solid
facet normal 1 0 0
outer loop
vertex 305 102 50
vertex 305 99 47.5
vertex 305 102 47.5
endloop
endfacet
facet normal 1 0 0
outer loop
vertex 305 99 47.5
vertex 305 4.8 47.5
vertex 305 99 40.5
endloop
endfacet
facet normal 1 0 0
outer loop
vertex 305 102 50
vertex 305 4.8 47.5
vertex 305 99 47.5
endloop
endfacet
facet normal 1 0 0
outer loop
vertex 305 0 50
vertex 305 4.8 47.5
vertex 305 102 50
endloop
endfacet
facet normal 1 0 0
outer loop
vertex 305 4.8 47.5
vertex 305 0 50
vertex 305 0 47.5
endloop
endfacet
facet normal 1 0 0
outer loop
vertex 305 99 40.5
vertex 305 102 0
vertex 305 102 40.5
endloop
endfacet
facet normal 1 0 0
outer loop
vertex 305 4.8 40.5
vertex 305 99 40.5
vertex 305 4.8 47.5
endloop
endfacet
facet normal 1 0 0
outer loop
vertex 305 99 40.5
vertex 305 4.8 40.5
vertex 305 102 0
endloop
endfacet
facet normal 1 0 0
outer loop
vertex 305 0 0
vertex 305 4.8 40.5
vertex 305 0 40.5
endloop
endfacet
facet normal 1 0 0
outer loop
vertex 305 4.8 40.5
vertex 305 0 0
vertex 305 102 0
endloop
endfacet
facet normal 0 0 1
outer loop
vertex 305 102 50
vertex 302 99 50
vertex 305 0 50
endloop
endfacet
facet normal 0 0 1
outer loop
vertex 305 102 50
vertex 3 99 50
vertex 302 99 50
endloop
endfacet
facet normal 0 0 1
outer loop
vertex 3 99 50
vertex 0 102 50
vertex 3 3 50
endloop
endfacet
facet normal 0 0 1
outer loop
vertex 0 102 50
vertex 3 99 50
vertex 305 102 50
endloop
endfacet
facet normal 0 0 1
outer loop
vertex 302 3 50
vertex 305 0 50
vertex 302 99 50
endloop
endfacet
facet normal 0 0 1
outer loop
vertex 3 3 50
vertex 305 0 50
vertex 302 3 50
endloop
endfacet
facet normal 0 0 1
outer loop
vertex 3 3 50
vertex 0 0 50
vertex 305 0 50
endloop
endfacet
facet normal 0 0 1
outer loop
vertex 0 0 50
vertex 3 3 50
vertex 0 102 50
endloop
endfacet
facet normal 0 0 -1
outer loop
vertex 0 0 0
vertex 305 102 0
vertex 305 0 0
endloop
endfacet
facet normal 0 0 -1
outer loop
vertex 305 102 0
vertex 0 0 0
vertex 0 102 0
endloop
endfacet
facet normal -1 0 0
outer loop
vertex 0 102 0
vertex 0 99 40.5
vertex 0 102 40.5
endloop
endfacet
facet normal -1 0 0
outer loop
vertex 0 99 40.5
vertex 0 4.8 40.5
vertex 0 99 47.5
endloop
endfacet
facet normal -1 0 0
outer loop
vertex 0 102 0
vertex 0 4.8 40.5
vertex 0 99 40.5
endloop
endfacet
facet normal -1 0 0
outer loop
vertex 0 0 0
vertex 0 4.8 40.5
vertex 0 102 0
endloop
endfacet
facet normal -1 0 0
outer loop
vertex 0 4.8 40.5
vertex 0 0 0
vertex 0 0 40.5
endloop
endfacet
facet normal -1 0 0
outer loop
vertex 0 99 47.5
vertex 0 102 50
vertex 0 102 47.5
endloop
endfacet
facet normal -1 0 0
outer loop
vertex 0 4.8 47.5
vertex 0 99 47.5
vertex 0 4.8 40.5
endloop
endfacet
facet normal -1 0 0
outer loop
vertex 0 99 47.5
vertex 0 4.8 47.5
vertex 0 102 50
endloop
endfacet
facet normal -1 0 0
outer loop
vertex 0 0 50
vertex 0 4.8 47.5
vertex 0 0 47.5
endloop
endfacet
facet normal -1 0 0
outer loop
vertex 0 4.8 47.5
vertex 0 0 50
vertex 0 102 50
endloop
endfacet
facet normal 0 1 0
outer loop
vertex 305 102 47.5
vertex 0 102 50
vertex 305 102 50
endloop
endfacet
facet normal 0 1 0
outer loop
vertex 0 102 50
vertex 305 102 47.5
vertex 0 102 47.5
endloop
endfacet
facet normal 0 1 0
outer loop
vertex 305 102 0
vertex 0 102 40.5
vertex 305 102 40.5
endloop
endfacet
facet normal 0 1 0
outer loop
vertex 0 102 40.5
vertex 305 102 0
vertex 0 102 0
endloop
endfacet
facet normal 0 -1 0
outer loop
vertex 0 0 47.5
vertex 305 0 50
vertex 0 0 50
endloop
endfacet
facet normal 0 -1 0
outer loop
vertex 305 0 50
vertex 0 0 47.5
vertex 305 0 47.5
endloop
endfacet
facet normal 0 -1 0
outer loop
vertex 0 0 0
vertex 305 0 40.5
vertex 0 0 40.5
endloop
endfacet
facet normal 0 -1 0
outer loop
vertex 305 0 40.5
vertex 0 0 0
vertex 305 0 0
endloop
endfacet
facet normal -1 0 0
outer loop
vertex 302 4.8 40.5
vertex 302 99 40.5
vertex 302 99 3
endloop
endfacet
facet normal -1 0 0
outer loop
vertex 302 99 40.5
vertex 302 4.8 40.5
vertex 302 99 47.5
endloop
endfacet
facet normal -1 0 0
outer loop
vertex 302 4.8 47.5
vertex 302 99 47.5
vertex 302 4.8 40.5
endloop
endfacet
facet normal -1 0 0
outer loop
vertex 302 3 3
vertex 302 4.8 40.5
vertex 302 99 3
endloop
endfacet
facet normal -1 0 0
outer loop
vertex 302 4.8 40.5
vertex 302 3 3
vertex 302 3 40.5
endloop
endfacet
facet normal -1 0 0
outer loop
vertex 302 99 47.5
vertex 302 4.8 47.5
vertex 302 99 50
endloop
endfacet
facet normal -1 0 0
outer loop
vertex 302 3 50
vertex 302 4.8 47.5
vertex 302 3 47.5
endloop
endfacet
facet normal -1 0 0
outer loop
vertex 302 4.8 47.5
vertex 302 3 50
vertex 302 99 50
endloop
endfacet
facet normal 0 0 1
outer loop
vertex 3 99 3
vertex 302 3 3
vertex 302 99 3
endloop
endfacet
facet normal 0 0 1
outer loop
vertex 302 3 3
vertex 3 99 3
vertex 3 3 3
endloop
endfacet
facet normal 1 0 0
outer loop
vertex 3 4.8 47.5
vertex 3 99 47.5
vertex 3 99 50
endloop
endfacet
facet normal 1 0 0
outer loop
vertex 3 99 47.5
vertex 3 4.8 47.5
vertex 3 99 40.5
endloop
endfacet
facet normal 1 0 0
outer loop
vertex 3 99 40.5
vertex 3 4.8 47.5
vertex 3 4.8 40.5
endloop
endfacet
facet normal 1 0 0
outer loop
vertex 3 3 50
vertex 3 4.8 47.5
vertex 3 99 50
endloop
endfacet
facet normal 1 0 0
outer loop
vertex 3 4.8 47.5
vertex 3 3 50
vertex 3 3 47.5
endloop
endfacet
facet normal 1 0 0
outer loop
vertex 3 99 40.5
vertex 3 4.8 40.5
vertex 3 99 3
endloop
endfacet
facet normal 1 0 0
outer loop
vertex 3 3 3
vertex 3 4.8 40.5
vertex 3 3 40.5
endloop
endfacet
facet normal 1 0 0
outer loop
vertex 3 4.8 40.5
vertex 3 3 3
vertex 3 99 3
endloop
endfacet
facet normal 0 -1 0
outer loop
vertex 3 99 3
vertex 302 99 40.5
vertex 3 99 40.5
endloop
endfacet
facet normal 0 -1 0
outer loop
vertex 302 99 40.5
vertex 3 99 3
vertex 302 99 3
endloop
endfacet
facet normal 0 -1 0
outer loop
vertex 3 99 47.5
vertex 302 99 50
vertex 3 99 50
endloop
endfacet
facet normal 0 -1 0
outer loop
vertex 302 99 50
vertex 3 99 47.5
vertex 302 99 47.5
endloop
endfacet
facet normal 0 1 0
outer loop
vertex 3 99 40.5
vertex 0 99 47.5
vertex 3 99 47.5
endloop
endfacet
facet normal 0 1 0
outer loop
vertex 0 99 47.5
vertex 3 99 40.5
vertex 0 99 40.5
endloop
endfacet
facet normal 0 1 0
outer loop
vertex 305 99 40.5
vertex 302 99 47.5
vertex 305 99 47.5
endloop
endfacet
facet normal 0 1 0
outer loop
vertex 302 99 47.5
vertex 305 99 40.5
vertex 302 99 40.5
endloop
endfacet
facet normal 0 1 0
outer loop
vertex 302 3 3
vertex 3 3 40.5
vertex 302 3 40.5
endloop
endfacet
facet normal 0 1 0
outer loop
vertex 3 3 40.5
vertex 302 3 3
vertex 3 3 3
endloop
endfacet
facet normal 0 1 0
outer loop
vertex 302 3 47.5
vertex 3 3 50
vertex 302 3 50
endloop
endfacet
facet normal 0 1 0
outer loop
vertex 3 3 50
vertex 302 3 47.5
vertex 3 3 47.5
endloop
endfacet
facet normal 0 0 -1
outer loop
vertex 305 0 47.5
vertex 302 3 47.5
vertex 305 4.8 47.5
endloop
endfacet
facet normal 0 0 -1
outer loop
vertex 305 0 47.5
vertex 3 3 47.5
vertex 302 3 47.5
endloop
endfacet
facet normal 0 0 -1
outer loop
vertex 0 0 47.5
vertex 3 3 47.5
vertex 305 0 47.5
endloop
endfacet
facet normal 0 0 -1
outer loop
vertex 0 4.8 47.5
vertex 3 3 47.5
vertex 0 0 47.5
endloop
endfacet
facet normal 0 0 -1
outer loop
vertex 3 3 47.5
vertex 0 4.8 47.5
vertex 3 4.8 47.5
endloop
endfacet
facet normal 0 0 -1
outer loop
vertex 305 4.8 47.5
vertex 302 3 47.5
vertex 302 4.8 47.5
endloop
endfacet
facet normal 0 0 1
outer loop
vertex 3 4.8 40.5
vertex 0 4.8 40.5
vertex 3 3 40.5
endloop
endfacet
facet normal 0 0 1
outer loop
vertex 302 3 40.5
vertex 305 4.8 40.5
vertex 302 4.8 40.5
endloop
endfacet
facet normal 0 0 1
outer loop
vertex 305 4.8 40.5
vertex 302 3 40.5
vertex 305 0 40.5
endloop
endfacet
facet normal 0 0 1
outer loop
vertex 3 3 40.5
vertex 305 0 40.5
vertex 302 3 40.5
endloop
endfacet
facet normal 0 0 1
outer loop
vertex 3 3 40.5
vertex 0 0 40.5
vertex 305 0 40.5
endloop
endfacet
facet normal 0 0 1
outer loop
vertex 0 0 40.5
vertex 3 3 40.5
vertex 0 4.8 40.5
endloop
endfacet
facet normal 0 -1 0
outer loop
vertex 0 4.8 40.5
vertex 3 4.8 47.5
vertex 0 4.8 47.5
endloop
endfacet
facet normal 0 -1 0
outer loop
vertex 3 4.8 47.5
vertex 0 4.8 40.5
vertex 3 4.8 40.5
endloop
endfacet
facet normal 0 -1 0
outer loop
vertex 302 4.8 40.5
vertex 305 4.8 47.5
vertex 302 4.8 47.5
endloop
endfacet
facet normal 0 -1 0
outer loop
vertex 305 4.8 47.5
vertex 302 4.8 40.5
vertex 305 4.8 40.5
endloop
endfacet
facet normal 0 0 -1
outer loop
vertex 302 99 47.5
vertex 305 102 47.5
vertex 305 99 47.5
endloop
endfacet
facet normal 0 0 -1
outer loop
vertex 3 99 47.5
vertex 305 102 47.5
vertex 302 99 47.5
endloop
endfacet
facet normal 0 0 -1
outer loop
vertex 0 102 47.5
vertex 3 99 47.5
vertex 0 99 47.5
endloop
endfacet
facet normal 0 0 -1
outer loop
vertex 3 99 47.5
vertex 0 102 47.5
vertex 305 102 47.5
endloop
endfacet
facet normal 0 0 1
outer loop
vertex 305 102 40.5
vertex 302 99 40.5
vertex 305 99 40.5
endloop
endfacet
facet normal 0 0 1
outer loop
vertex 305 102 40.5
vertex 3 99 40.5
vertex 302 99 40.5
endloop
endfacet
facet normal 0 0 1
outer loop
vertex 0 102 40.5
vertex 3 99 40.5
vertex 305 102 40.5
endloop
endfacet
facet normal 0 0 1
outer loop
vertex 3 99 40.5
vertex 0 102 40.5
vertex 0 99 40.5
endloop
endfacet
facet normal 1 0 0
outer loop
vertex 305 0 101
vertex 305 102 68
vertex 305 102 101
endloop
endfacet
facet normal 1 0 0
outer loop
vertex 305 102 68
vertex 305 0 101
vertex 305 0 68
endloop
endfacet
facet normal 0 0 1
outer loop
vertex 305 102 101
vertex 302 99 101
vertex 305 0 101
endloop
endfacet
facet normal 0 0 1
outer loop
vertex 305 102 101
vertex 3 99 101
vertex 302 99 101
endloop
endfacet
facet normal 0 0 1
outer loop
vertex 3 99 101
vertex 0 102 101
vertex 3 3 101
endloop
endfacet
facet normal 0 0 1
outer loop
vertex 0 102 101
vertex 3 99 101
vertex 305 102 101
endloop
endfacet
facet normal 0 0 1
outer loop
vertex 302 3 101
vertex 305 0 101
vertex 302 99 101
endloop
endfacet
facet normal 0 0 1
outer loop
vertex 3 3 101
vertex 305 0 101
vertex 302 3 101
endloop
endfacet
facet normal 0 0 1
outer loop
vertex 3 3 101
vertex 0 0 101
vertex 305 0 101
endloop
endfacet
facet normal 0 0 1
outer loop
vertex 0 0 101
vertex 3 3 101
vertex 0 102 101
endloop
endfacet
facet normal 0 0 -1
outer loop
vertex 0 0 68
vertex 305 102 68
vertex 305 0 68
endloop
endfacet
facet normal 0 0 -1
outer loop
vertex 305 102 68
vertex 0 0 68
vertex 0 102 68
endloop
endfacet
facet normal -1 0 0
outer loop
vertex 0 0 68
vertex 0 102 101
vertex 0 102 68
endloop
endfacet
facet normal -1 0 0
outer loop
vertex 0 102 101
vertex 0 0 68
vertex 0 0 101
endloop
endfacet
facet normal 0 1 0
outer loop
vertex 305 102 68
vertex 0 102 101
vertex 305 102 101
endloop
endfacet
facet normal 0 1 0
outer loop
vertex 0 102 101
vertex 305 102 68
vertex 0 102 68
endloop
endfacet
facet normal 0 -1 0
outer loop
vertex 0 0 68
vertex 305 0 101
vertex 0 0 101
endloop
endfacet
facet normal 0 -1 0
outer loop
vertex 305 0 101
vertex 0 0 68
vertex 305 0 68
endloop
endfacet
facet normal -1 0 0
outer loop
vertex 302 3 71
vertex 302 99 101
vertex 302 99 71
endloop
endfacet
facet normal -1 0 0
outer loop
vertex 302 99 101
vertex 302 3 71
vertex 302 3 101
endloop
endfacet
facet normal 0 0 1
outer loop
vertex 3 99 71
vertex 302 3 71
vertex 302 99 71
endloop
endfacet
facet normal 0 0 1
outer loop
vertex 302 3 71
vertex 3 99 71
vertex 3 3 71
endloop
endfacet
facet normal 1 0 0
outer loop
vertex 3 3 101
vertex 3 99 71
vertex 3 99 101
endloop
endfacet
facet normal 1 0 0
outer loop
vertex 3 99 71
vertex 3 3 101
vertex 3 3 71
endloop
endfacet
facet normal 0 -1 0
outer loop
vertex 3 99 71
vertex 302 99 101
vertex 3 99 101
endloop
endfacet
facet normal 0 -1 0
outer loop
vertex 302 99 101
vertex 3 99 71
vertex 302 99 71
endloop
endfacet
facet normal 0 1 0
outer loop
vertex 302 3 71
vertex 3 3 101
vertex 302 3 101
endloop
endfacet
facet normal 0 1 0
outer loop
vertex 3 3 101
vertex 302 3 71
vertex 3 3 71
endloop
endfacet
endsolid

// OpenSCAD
// 02_side_snap_lip.scad
// Full-length side snap lip: a continuous flexible bead runs the full 305 mm
// length on BOTH long sides of the upper tray's outer wall.
// The lower tray has a matching groove/channel on its outer faces.
// Engage: press upper tray straight down; bead rides ramp and snaps into groove.
// Release: insert flat tool (or fingernail) in gap and pry outward on one long side.

$fn = 36;
EXPLODE = 18;   // 0=engaged, >0=exploded

/* ---- tray dimensions ---- */
LX = 305; LY = 102; LZ = 50;
UX = 305; UY = 102; UZ = 33;
W  = 3;

/* ---- snap lip params ---- */
BEAD_R   = 1.4;   // bead radius
BEAD_Z   = 6.0;   // height above lower-tray top where bead centre sits
RAMP_H   = 1.6;   // ramp above bead to guide during assembly
GROOVE_D = 0.4;   // extra groove depth clearance
GROOVE_H = BEAD_R*2 + 0.6;  // groove height in lower tray wall

module lower_tray_body() {
    color("SteelBlue", 0.85)
    difference() {
        cube([LX, LY, LZ]);
        translate([W, W, W]) cube([LX-2*W, LY-2*W, LZ]);
    }
}

// Groove channel milled into lower tray outer walls (front & back, full length)
module lower_groove(y_face) {
    // y_face = 0 (front) or LY (back)
    gx = 0; gz = LZ - BEAD_Z - GROOVE_H/2;
    sy = (y_face == 0) ? 0 : LY - W;
    color("SteelBlue", 0.85)
    translate([gx, sy, gz])
        cube([LX, W, GROOVE_H]);
}

// Rebuild lower tray with grooves carved in
module lower_tray() {
    color("SteelBlue", 0.85)
    difference() {
        cube([LX, LY, LZ]);
        // hollow interior
        translate([W, W, W]) cube([LX-2*W, LY-2*W, LZ]);
        // front groove
        translate([0, -0.1, LZ - BEAD_Z - GROOVE_H/2 - BEAD_R - GROOVE_D])
            cube([LX, W + BEAD_R + GROOVE_D + 0.1, GROOVE_H + BEAD_R*2 + GROOVE_D*2]);
        // back groove
        translate([0, LY - W - 0.0, LZ - BEAD_Z - GROOVE_H/2 - BEAD_R - GROOVE_D])
            cube([LX, W + BEAD_R + GROOVE_D + 0.1, GROOVE_H + BEAD_R*2 + GROOVE_D*2]);
    }
}

// Snap bead profile: semicircular bead on a thin wall extension
// runs full length of upper tray long side
module snap_bead_side(y_offset, flip=false) {
    // The bead is a half-round extruded along X, on the outer face of the upper tray wall
    // positioned so it aligns with the groove when trays are mated
    color("Tomato", 0.88)
    translate([0, y_offset, 0])
    rotate([0, 90, 0])
    linear_extrude(UX)
    // bead profile in YZ plane
    // bead centre at (0, -BEAD_Z) from bottom of upper tray
    // wall goes from z=0 downward; bead protrudes outward in Y
    {
        fy = flip ? 1 : -1;
        bz = -BEAD_Z;
        union() {
            // wall extension (thin skirt below upper tray bottom)
            translate([bz - BEAD_R*1.5, 0]) square([BEAD_R*3 + 2, W]);
            // ramp above bead
            polygon(points=[
                [bz + BEAD_R + RAMP_H, 0],
                [bz + BEAD_R + RAMP_H, W],
                [bz + BEAD_R, W + BEAD_R + RAMP_H*0.5],
                [bz + BEAD_R, W]
            ]);
            // bead semicircle
            translate([bz, W])
            circle(r=BEAD_R, $fn=20);
        }
    }
}

module upper_tray_body() {
    color("Tomato", 0.85)
    difference() {
        cube([UX, UY, UZ]);
        translate([W, W, W]) cube([UX-2*W, UY-2*W, UZ]);
    }
}

module upper_tray() {
    upper_tray_body();
    // Snap bead on front wall (Y=0, bead points in -Y)
    translate([0, 0, 0])
    snap_bead_front();
    // Snap bead on back wall (Y=UY, bead points in +Y)
    translate([0, UY, 0])
    snap_bead_back();
}

// Front bead (protrudes in -Y from the front wall)
module snap_bead_front() {
    color("OrangeRed", 0.92)
    translate([0, 0, 0])
    rotate([0, 90, 0])
    linear_extrude(UX)
    {
        bz = -BEAD_Z;
        union() {
            translate([bz - BEAD_R - 1, -W]) square([BEAD_R*2 + 2, W]);
            translate([bz, -W - BEAD_R]) circle(r=BEAD_R, $fn=20);
            polygon(points=[
                [bz + BEAD_R, -W - BEAD_R],
                [bz + BEAD_R + RAMP_H, 0],
                [bz + BEAD_R, 0]
            ]);
        }
    }
}

// Back bead (protrudes in +Y from the back wall)
module snap_bead_back() {
    color("OrangeRed", 0.92)
    translate([0, 0, 0])
    rotate([0, 90, 0])
    linear_extrude(UX)
    {
        bz = -BEAD_Z;
        union() {
            translate([bz - BEAD_R - 1, 0]) square([BEAD_R*2 + 2, W]);
            translate([bz, W + BEAD_R]) circle(r=BEAD_R, $fn=20);
            polygon(points=[
                [bz + BEAD_R, W + BEAD_R],
                [bz + BEAD_R + RAMP_H, 0],
                [bz + BEAD_R, 0]
            ]);
        }
    }
}

/* ---- assembly ---- */
lower_tray();

translate([0, 0, LZ + EXPLODE]) {
    upper_tray_body();
    snap_bead_front();
    snap_bead_back();
}
